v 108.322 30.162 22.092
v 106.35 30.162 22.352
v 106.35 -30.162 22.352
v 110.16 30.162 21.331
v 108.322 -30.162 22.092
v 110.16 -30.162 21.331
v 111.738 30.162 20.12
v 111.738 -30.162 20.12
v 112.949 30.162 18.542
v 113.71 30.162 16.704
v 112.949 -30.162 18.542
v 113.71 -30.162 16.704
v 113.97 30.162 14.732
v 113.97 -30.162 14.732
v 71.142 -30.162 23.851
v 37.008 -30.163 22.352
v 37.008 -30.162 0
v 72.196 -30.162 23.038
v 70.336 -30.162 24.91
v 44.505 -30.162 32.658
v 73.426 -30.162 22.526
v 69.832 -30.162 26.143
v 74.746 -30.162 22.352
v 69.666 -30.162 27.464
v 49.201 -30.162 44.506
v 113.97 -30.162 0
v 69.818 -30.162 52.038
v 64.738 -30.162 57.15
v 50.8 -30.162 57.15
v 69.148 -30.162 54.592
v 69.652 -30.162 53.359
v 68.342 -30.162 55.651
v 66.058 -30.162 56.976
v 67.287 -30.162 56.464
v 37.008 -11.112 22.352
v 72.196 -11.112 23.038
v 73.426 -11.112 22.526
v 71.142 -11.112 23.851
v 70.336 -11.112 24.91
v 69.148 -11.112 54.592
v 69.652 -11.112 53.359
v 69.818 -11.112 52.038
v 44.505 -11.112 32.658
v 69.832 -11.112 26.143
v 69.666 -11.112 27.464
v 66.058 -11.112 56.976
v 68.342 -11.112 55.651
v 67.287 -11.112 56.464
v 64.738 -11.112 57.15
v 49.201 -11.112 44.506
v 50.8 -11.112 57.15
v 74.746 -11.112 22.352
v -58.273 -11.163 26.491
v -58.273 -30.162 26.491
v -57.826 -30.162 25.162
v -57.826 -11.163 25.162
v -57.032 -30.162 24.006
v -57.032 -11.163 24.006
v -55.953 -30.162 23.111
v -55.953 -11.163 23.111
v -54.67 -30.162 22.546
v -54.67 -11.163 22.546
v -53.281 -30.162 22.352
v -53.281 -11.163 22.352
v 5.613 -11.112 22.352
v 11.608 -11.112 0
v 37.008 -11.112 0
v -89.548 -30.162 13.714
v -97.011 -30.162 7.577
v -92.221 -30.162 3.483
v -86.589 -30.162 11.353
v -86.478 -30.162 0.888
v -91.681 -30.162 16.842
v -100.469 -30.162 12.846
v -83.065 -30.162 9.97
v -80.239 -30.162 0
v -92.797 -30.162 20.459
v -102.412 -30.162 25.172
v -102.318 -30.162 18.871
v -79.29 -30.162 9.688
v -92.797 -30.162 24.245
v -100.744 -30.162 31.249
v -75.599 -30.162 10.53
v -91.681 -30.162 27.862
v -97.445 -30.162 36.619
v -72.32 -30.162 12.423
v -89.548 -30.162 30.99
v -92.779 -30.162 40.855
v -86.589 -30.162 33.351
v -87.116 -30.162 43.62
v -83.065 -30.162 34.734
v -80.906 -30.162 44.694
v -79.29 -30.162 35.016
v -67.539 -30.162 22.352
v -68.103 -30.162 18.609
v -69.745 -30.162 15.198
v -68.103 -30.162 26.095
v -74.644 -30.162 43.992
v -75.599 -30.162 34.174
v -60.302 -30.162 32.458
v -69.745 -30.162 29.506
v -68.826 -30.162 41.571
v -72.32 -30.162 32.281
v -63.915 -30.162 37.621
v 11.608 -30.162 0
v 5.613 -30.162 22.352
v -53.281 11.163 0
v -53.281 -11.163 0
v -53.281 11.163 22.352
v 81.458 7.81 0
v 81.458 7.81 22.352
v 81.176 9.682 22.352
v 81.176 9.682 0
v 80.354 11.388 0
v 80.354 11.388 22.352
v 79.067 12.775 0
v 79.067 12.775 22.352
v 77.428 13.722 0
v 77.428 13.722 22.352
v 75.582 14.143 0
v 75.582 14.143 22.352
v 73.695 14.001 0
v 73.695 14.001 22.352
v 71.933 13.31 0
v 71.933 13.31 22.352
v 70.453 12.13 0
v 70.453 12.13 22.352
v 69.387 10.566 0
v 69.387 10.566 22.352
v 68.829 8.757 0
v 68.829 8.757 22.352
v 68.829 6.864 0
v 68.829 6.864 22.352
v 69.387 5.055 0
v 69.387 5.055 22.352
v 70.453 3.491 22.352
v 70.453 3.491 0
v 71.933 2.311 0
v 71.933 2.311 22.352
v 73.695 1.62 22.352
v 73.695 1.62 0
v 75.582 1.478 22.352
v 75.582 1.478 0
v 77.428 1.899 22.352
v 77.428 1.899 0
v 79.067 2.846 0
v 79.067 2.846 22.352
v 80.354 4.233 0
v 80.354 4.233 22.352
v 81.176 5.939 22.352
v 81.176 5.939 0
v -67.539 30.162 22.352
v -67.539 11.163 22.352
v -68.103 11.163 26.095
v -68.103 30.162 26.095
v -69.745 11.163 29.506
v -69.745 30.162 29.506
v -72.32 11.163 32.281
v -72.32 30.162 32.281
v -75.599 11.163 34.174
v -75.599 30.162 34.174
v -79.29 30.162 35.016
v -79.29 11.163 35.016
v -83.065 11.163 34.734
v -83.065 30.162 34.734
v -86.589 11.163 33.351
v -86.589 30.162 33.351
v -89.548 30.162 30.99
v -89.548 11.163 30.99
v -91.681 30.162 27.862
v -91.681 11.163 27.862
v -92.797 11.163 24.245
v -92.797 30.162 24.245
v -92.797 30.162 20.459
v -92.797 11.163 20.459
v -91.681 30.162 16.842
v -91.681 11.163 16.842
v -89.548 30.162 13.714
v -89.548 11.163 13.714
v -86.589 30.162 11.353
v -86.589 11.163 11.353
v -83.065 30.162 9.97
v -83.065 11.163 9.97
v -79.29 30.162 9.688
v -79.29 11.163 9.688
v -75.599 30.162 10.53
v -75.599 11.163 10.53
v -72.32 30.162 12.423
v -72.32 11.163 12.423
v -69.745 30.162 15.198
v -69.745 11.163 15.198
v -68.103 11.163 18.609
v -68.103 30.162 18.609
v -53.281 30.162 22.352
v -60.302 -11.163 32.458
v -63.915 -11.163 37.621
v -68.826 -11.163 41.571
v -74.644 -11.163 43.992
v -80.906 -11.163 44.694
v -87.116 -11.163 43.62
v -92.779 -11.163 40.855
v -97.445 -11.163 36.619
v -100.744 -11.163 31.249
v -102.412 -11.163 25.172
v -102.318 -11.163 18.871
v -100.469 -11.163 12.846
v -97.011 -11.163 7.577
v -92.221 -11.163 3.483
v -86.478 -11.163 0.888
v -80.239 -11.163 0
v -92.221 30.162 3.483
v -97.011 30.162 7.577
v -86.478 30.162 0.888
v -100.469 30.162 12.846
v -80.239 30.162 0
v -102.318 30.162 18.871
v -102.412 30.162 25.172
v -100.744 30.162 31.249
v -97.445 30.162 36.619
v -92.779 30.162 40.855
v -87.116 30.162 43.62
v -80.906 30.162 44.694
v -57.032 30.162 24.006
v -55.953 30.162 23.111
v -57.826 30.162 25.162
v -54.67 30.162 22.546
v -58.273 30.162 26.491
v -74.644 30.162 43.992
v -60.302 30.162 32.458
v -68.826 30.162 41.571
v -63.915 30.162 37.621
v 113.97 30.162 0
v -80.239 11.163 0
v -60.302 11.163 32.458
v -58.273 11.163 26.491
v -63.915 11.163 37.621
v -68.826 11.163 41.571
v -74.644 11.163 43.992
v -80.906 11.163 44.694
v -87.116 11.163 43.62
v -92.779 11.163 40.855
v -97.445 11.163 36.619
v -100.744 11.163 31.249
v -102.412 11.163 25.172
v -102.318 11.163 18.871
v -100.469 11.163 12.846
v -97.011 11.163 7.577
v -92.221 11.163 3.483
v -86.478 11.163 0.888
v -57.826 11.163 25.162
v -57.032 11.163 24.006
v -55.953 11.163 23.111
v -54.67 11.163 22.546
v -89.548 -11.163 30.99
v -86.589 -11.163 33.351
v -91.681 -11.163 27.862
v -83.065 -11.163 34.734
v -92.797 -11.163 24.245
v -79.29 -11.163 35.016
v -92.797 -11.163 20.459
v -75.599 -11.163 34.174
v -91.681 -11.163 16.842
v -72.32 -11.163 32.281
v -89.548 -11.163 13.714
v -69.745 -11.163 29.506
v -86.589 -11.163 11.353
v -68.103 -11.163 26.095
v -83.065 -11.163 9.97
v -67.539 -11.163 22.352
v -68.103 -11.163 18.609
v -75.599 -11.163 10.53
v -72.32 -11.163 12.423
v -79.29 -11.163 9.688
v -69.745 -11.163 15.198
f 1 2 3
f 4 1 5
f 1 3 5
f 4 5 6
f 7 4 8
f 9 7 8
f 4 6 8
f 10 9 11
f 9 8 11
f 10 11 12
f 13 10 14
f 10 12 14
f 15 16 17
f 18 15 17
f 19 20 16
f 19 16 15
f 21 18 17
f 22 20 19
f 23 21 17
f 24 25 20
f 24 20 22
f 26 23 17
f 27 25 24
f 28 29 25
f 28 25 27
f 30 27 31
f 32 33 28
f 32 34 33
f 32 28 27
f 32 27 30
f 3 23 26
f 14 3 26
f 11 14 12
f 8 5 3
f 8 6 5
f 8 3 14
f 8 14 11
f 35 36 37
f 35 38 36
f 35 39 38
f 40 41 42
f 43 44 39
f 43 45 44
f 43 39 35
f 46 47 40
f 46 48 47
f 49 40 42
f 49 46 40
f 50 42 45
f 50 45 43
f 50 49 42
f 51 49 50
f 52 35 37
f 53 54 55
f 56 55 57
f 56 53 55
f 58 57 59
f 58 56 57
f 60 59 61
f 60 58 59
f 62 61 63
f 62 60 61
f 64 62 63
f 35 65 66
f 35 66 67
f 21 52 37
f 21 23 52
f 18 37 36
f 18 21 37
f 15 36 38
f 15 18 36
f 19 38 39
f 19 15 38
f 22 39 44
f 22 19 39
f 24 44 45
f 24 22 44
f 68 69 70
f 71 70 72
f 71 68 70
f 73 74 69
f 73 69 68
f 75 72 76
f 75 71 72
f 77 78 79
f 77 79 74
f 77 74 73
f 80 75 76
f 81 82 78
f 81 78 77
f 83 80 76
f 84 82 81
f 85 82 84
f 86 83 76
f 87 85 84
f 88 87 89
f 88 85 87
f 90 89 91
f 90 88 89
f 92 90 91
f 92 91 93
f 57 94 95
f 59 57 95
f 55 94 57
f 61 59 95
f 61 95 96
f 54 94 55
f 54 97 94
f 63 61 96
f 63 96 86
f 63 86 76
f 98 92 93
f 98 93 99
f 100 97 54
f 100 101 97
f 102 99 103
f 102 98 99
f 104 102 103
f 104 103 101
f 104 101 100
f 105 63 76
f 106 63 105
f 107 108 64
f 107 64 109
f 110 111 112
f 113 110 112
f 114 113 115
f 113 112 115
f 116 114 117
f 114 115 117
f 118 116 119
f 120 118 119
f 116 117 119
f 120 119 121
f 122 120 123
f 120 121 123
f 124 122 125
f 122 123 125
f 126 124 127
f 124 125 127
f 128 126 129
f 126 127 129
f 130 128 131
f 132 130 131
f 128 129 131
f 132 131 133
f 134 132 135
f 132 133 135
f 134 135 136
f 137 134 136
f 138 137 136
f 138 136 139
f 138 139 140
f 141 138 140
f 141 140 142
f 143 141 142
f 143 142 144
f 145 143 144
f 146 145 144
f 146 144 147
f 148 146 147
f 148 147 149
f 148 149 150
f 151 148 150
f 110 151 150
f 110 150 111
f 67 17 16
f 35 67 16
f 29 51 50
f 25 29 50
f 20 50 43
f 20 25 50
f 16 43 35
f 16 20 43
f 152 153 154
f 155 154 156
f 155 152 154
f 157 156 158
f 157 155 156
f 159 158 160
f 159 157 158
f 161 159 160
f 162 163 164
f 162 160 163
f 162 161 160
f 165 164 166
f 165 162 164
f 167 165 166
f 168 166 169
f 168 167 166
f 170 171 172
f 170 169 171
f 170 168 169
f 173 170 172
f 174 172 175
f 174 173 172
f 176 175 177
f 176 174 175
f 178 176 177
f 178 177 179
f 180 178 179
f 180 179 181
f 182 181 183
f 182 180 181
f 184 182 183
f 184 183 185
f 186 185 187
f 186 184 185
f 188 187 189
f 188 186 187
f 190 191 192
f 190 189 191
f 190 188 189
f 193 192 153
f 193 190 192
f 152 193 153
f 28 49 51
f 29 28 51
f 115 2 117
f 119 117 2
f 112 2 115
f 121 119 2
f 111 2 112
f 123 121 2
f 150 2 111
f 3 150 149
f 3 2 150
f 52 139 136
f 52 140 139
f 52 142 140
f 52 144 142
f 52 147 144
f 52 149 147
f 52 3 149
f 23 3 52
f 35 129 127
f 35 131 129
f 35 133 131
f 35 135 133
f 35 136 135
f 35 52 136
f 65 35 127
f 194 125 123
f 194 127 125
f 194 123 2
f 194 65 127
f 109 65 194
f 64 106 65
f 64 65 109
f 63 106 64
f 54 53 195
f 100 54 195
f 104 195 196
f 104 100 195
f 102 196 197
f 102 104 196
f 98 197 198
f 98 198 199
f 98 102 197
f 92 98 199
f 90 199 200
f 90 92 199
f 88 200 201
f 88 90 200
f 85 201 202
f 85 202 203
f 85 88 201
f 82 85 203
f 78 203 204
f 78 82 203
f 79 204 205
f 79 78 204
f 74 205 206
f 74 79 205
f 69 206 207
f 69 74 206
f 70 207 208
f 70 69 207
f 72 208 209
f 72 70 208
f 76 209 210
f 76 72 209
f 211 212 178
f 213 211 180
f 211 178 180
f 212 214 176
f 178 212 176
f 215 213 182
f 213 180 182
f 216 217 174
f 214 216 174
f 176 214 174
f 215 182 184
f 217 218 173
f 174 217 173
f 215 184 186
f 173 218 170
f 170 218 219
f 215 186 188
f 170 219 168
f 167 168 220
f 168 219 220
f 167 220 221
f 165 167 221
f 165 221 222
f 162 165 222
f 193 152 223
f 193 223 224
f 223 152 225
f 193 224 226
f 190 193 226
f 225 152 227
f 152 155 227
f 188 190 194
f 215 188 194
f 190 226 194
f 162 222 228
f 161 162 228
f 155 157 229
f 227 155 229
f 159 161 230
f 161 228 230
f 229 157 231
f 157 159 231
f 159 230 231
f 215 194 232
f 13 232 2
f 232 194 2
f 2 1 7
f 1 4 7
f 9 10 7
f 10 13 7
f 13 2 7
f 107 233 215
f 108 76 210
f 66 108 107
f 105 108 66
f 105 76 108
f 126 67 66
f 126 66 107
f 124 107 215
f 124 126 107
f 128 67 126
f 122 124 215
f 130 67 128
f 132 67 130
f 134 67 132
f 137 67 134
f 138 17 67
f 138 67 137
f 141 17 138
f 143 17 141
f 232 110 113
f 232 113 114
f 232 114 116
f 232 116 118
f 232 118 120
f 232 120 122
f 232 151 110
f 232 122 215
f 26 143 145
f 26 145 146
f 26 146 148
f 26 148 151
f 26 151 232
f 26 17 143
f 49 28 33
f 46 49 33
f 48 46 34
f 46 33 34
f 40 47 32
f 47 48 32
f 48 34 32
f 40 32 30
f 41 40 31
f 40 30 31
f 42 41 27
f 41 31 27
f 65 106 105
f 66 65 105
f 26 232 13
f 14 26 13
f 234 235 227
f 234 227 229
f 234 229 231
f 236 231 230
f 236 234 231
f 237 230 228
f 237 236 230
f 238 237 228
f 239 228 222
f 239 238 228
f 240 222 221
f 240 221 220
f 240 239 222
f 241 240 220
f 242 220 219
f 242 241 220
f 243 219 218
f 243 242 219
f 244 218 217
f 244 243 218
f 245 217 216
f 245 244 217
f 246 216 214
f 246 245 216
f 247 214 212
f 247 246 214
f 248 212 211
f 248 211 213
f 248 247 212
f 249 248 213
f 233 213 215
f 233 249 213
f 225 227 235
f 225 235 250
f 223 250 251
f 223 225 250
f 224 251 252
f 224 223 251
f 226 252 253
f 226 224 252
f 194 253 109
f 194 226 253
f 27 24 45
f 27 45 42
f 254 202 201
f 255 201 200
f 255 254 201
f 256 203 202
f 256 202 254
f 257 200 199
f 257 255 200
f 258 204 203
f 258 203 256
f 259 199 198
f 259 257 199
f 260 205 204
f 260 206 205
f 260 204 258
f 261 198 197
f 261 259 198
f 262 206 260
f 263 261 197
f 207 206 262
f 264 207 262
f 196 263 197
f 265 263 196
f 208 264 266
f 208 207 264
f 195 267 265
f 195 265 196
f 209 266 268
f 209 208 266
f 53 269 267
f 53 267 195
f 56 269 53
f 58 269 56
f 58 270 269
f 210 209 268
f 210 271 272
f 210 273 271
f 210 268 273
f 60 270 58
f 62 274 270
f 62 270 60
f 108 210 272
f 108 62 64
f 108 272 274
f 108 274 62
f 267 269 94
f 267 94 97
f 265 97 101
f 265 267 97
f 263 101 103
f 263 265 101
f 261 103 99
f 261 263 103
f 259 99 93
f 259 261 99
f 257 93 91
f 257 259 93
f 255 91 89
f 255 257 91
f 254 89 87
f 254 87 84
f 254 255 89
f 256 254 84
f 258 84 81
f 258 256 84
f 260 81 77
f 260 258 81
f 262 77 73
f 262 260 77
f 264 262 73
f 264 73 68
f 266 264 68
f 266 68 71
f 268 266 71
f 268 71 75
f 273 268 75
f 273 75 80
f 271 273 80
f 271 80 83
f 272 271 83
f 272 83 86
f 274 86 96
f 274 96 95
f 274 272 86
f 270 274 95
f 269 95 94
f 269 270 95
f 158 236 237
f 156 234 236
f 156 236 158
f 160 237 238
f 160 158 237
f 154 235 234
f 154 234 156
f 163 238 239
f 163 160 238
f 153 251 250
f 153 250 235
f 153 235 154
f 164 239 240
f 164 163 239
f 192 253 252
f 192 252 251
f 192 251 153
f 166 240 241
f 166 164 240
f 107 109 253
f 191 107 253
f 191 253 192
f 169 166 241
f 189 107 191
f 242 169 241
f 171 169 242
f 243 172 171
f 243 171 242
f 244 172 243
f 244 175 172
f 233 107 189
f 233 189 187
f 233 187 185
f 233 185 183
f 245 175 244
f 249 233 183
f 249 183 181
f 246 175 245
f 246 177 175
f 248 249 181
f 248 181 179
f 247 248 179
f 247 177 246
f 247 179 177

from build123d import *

# Parameters (mm, degrees)
F0_R      = 12.7
F1_DEPTH  = 30.1625
F4_R      = 5.08
F5_R      = 7.62
F6_R      = 5.08
F7_DEPTH  = 41.275
F9_DEPTH  = 19.05
F10_R     = 5.08
F11_W     = 22.352
F11_H     = 22.3266
F11_W_2   = 21.9653917967
F11_W_3   = 4.9921344993
F12_DEPTH = 57.151
F13_R     = 6.35
F14_DEPTH = 22.353


# Not quite as in the source:
# - a feature names something its author has since deleted; it is built from what else it names


with BuildPart() as f1:
    # F0 (on Front) → F1 (new body, symmetric)
    with BuildSketch(Plane.XZ):
        with BuildLine():
            Line((11.6077999467, 0), (5.6133999467, 22.352))
            Line((5.6133999467, 22.352), (-57.8866000533, 22.352))
            ThreePointArc((-57.8866000533, 22.352), (-64.4333492802, 6.5467492269), (-80.2386000533, 0))
            Line((-80.2386000533, 0), (11.6077999467, 0))
        make_face()
        Polygon((69.6339349389, 22.352), (37.0077999467, 22.352), (37.0077999467, 0), (69.4951486566, 0), align=None)
        Polygon((113.9697999467, 22.352), (69.6339349389, 22.352), (69.4951486566, 0), (113.9697999467, 0), align=None)
        with BuildLine():
            ThreePointArc((-80.2386000533, 0), (-64.4333492802, 6.5467492269), (-57.8866000533, 22.352))
            ThreePointArc((-57.8866000533, 22.352), (-96.0438508264, 38.1572507731), (-80.2386000533, 0))
        make_face()
        with Locations((-80.2386000533, 22.352)):
            Circle(F0_R, mode=Mode.SUBTRACT)
        Polygon((37.0077999467, 0), (37.0077999467, 22.352), (5.6133999467, 22.352), (11.6077999467, 0), align=None)
        with BuildLine():
            ThreePointArc((50.7999999467, 57.15), (47.2258153083, 38.4343576341), (37.0077999467, 22.352))
            Line((37.0077999467, 22.352), (69.6339349389, 22.352))
            Line((69.6339349389, 22.352), (69.8499999467, 57.15))
            Line((69.8499999467, 57.15), (50.7999999467, 57.15))
        make_face()
    extrude(amount=F1_DEPTH, both=True)

    # F4
    f4_edges = [f1.edges().sort_by_distance(p)[0] for p in [
        (69.85, 0, 57.15),
    ]]
    fillet(f4_edges, radius=F4_R)

    # F5
    f5_edges = [f1.edges().sort_by_distance(p)[0] for p in [
        (113.9698, 0, 22.352),
    ]]
    fillet(f5_edges, radius=F5_R)

    # F6
    f6_edges = [f1.edges().sort_by_distance(p)[0] for p in [
        (-57.8866, 0, 22.352),
    ]]
    fillet(f6_edges, radius=F6_R)

    # F3 (on face) → F7 (cut)
    with BuildSketch(Plane(origin=(0, 30.1625, 0), x_dir=(-1, 0, 0), z_dir=(0, 1, 0))):
        with BuildLine():
            Line((-69.8499999467, 57.15), (-69.6339349389, 22.352))
            Line((-69.6339349389, 22.352), (-37.0077999467, 22.352))
            ThreePointArc((-37.0077999467, 22.352), (-47.2258153083, 38.4343576341), (-50.7999999467, 57.15))
            Line((-50.7999999467, 57.15), (-69.8499999467, 57.15))
        make_face()
    extrude(amount=-F7_DEPTH, mode=Mode.SUBTRACT)

    # F2 (on face) → F9 (cut)
    with BuildSketch(Plane.XZ.offset(30.1625)):
        Polygon((37.0077999467, 22.352), (5.6133999467, 22.352), (11.6077999467, 0), (37.0077999467, 0), align=None)
    extrude(amount=-F9_DEPTH, mode=Mode.SUBTRACT)

    # F10
    f10_edges = [f1.edges().sort_by_distance(p)[0] for p in [
        (69.633935, -20.6375, 22.352),
    ]]
    fillet(f10_edges, radius=F10_R)

    # F11 (on Top) → F12 (cut, through all)
    with BuildSketch(Plane.XY):
        with Locations((-91.4146000533, 0)):
            Rectangle(F11_W, F11_H)
        with Locations((-69.2559041549, 0)):
            Rectangle(F11_W_2, F11_H)
        with Locations((-55.7771410069, 0)):
            Rectangle(F11_W_3, F11_H)
    extrude(amount=F12_DEPTH, mode=Mode.SUBTRACT)

    # F13 (on face) → F14 (cut, through all)
    with BuildSketch(Plane.XY.offset(22.352)):
        with Locations((75.1077999467, 7.8105)):
            Circle(F13_R)
    extrude(amount=-F14_DEPTH, mode=Mode.SUBTRACT)


solid = f1.part
